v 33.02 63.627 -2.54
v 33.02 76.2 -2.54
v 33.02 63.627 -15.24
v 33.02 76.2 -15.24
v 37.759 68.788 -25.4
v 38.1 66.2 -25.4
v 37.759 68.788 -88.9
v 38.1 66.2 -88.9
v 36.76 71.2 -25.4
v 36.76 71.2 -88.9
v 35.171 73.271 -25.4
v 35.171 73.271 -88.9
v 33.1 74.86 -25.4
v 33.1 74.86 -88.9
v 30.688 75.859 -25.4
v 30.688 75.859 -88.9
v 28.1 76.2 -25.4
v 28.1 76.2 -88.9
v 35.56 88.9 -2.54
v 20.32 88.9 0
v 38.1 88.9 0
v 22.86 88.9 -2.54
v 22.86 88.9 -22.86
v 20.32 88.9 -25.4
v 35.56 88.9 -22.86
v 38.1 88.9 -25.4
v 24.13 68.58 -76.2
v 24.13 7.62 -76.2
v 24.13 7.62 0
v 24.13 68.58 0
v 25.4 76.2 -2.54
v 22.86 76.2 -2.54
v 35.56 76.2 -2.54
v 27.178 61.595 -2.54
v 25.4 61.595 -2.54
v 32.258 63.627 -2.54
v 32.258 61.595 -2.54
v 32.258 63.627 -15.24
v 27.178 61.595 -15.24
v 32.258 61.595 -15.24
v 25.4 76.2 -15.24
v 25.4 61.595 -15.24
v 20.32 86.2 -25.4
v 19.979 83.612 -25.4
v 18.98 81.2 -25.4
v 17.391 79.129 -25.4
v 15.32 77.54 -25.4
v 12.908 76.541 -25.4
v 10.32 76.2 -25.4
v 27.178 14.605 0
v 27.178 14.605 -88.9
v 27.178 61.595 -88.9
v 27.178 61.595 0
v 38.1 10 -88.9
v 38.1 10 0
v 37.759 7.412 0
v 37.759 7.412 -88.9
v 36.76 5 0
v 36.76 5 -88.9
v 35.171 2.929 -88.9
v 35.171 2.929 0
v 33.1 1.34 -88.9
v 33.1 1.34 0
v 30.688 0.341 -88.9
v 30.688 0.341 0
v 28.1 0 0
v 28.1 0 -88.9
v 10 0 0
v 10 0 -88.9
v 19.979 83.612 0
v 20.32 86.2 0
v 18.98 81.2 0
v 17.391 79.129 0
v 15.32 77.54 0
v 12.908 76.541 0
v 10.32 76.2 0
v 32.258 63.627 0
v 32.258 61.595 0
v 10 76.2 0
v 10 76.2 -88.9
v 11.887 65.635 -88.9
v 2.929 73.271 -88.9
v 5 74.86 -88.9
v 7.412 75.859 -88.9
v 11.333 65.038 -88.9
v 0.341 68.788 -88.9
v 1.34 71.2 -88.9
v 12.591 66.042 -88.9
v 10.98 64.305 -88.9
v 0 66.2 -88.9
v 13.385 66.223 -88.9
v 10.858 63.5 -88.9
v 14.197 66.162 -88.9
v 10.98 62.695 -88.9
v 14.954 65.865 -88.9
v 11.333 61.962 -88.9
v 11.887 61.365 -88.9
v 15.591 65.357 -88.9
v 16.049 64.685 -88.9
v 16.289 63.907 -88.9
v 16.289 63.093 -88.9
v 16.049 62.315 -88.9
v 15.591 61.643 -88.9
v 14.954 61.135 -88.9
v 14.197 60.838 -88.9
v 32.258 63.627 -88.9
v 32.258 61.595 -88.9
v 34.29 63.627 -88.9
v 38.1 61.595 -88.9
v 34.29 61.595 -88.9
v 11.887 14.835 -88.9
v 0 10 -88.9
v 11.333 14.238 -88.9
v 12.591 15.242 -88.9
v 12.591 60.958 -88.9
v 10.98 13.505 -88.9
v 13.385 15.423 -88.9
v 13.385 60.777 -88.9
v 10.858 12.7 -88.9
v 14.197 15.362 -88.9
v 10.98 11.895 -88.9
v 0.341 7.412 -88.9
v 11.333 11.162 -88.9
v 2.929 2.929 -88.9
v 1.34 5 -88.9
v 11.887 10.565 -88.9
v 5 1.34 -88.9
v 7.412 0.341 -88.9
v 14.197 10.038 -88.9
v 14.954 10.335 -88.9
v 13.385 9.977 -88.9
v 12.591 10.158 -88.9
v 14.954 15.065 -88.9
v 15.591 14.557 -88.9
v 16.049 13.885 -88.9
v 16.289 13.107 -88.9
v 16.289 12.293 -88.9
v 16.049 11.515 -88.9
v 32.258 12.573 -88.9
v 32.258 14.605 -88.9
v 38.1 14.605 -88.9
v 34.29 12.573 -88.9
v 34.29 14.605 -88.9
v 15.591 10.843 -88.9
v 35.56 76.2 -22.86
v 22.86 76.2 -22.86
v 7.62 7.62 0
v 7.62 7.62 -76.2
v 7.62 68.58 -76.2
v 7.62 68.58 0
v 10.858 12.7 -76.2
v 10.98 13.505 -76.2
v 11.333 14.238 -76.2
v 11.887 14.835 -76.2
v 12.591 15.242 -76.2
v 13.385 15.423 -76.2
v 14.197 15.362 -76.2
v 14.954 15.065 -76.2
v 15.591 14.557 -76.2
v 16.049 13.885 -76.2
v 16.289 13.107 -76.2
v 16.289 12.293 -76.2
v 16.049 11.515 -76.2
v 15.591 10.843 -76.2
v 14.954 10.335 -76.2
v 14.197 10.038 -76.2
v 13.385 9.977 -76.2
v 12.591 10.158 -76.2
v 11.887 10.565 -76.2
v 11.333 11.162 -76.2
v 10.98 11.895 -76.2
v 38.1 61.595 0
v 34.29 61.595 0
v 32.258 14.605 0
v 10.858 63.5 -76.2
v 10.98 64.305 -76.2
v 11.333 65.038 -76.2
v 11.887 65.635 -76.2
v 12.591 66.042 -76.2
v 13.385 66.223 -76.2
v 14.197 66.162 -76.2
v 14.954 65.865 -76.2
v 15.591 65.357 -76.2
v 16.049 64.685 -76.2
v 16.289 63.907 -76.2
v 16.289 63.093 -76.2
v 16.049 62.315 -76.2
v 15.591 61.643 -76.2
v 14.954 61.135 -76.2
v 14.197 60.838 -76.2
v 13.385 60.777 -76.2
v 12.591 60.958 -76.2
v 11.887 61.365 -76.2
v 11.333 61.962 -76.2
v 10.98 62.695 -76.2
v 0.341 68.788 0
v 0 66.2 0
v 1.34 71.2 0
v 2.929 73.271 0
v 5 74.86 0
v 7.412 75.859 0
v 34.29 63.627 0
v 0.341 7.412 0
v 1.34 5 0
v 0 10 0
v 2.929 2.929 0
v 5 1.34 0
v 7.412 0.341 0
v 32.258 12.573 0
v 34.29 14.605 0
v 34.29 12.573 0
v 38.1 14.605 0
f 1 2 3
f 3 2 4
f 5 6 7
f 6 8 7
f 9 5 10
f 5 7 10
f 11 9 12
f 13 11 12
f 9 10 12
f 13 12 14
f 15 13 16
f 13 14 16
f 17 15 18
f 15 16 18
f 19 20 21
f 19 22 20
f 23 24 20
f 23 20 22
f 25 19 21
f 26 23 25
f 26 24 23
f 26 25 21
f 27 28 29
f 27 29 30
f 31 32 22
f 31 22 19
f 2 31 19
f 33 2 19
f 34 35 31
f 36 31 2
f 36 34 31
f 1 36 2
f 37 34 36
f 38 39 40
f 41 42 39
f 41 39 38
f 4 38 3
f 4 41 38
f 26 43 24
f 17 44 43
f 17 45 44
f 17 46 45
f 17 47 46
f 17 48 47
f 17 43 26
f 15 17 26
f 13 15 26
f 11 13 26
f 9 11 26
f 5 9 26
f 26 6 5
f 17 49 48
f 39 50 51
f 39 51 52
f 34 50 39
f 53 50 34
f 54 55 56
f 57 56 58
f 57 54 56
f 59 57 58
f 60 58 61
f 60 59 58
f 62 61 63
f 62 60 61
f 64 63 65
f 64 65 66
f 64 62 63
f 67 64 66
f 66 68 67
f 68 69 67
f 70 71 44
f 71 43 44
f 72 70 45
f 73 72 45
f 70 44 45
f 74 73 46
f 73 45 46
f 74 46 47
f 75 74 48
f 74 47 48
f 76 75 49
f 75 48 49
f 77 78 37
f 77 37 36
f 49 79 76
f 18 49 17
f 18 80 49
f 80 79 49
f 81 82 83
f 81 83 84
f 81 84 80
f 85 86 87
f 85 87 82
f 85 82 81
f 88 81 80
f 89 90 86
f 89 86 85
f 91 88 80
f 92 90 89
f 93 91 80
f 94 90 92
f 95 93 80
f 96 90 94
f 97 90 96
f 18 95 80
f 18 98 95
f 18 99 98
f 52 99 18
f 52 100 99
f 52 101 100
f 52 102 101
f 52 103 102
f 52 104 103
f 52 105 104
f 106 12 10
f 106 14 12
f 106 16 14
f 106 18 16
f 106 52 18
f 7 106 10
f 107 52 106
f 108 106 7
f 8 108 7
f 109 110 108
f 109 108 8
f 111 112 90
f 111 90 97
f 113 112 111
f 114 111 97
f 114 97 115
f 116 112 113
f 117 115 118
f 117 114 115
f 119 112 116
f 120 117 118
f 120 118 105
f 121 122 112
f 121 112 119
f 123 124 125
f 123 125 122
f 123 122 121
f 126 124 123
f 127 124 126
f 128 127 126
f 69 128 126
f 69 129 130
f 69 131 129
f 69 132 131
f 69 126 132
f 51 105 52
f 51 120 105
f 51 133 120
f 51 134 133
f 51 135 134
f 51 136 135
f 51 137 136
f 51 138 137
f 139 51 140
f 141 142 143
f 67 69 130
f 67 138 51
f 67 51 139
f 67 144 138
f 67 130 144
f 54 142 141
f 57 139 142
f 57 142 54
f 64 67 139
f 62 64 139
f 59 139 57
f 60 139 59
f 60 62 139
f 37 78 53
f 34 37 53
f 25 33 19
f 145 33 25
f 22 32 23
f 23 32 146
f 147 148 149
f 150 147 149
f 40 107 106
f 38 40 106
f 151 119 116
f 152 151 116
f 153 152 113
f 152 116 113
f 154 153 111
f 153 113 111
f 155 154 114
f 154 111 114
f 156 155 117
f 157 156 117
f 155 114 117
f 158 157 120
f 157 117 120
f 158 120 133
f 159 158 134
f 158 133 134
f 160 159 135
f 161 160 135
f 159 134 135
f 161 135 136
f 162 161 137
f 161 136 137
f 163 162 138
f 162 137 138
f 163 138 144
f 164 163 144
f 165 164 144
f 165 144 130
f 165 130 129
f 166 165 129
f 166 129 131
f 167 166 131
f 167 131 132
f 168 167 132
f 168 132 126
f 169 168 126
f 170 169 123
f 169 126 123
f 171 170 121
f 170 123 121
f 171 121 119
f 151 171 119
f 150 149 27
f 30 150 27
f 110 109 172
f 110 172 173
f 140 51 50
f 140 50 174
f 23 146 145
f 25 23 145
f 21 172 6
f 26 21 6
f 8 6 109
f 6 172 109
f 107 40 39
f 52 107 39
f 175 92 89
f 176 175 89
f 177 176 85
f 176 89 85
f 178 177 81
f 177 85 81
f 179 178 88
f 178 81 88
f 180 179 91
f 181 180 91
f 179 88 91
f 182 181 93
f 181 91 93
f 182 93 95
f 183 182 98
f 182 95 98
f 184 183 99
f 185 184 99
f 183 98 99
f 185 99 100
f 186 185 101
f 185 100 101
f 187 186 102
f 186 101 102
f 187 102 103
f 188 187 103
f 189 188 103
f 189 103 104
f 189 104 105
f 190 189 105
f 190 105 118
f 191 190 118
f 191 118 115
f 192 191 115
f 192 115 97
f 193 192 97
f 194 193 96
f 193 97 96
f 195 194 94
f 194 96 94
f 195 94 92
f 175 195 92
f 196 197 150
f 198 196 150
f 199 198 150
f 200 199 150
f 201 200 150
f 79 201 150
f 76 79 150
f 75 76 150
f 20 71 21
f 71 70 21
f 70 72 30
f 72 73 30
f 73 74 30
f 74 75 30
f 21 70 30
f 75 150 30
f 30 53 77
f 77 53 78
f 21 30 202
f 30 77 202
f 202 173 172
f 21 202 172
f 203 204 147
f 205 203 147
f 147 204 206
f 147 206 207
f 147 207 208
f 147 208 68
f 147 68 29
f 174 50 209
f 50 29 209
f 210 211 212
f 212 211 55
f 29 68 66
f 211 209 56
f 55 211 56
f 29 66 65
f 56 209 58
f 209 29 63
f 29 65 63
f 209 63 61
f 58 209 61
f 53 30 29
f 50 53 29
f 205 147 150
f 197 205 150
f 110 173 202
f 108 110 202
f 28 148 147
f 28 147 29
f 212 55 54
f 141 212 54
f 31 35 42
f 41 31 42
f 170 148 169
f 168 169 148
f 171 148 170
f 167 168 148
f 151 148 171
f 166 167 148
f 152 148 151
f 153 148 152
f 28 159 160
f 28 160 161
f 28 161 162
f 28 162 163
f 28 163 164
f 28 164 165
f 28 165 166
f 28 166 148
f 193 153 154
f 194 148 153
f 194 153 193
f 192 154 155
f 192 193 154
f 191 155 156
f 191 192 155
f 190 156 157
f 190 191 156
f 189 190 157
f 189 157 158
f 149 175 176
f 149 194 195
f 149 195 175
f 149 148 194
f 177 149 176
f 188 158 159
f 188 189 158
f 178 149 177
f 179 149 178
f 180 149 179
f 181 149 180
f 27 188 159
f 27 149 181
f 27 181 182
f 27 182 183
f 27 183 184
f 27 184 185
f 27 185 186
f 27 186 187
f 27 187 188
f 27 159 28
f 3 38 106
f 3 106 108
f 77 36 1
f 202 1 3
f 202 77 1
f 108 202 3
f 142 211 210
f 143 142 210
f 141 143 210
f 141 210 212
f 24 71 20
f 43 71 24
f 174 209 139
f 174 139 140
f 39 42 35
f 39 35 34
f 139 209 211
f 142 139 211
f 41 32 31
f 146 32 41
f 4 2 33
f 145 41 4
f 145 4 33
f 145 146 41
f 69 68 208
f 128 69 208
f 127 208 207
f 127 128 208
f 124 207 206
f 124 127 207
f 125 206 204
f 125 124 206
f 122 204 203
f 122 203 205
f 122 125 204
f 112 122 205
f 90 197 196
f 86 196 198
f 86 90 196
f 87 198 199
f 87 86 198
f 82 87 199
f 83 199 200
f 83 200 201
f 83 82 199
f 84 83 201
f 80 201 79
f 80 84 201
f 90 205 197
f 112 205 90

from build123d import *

# Parameters (mm, degrees)
SKETCH1_W           = 38.1
SKETCH1_H           = 88.9
BOSS_EXTRUDE1_DEPTH = 76.2
SKETCH2_W           = 16.51
SKETCH2_H           = 60.96
CUT_EXTRUDE1_DEPTH  = 76.2
SKETCH3_W           = 5.08
SKETCH3_H           = 46.99
SKETCH3_W_2         = 2.032
SKETCH3_W_3         = 3.81
SKETCH3_H_2         = 2.032
CUT_EXTRUDE2_DEPTH  = 89.9
SKETCH5_W           = 7.62
SKETCH5_H           = 12.7
CUT_EXTRUDE3_DEPTH  = 14.605
SKETCH6_W           = 17.78
SKETCH6_H           = 25.4
SKETCH6_W_2         = 12.7
SKETCH6_H_2         = 20.32
BOSS_EXTRUDE2_DEPTH = 12.7
FILLET2_R           = 10
SKETCH7_R           = 2.7305
CUT_EXTRUDE4_DEPTH  = 12.7


with BuildPart() as part:
    # Sketch1 → Boss-Extrude1 (new body)
    with BuildSketch(Plane(origin=(0, 0, 0), x_dir=(1, 0, 0), z_dir=(0, 1, 0))):
        with Locations((19.05, 44.45)):
            Rectangle(SKETCH1_W, SKETCH1_H)
    extrude(amount=BOSS_EXTRUDE1_DEPTH)

    # Sketch2 → Cut-Extrude1 (cut)
    with BuildSketch(Plane.XY):
        with Locations((15.875, 38.1)):
            Rectangle(SKETCH2_W, SKETCH2_H)
    extrude(amount=-CUT_EXTRUDE1_DEPTH, mode=Mode.SUBTRACT)

    # Sketch3 → Cut-Extrude2 (cut, through all)
    with BuildSketch(Plane.XY):
        with Locations((29.718, 38.1)):
            Rectangle(SKETCH3_W, SKETCH3_H)
        with Locations((33.274, 38.1)):
            Rectangle(SKETCH3_W_2, SKETCH3_H)
        with Locations((36.195, 38.1)):
            Rectangle(SKETCH3_W_3, SKETCH3_H)
        with Locations((33.274, 62.611)):
            Rectangle(SKETCH3_W_2, SKETCH3_H_2)
        with Locations((33.274, 13.589)):
            Rectangle(SKETCH3_W_2, SKETCH3_H_2)
    extrude(amount=-CUT_EXTRUDE2_DEPTH, mode=Mode.SUBTRACT)

    # Sketch5 → Cut-Extrude3 (cut)
    with BuildSketch(Plane(origin=(0, 76.2, 0), x_dir=(1, 0, 0), z_dir=(0, 1, 0))):
        with Locations((29.21, 8.89)):
            Rectangle(SKETCH5_W, SKETCH5_H)
    extrude(amount=-CUT_EXTRUDE3_DEPTH, mode=Mode.SUBTRACT)

    # Sketch6 → Boss-Extrude2 (add)
    with BuildSketch(Plane(origin=(0, 76.2, 0), x_dir=(1, 0, 0), z_dir=(0, 1, 0))):
        with Locations((29.21, 12.7)):
            Rectangle(SKETCH6_W, SKETCH6_H)
        with Locations((29.21, 12.7)):
            Rectangle(SKETCH6_W_2, SKETCH6_H_2, mode=Mode.SUBTRACT)
    extrude(amount=BOSS_EXTRUDE2_DEPTH)

    # Fillet2
    fillet2_edges = [part.edges().sort_by_distance(p)[0] for p in [
        (20.32, 76.2, -12.7),
        (0, 76.2, -44.45),
        (38.1, 0, -44.45),
        (0, 0, -44.45),
        (38.1, 76.2, -57.15),
    ]]
    fillet(fillet2_edges, radius=FILLET2_R)

    # Sketch7 → Cut-Extrude4 (cut)
    with BuildSketch(Plane(origin=(0, 0, -88.9), x_dir=(-1, 0, 0), z_dir=(0, 0, -1))):
        with Locations((-13.589, 63.5)):
            Circle(SKETCH7_R)
        with Locations((-13.589, 12.7)):
            Circle(SKETCH7_R)
    extrude(amount=-CUT_EXTRUDE4_DEPTH, mode=Mode.SUBTRACT)


solid = part.part
